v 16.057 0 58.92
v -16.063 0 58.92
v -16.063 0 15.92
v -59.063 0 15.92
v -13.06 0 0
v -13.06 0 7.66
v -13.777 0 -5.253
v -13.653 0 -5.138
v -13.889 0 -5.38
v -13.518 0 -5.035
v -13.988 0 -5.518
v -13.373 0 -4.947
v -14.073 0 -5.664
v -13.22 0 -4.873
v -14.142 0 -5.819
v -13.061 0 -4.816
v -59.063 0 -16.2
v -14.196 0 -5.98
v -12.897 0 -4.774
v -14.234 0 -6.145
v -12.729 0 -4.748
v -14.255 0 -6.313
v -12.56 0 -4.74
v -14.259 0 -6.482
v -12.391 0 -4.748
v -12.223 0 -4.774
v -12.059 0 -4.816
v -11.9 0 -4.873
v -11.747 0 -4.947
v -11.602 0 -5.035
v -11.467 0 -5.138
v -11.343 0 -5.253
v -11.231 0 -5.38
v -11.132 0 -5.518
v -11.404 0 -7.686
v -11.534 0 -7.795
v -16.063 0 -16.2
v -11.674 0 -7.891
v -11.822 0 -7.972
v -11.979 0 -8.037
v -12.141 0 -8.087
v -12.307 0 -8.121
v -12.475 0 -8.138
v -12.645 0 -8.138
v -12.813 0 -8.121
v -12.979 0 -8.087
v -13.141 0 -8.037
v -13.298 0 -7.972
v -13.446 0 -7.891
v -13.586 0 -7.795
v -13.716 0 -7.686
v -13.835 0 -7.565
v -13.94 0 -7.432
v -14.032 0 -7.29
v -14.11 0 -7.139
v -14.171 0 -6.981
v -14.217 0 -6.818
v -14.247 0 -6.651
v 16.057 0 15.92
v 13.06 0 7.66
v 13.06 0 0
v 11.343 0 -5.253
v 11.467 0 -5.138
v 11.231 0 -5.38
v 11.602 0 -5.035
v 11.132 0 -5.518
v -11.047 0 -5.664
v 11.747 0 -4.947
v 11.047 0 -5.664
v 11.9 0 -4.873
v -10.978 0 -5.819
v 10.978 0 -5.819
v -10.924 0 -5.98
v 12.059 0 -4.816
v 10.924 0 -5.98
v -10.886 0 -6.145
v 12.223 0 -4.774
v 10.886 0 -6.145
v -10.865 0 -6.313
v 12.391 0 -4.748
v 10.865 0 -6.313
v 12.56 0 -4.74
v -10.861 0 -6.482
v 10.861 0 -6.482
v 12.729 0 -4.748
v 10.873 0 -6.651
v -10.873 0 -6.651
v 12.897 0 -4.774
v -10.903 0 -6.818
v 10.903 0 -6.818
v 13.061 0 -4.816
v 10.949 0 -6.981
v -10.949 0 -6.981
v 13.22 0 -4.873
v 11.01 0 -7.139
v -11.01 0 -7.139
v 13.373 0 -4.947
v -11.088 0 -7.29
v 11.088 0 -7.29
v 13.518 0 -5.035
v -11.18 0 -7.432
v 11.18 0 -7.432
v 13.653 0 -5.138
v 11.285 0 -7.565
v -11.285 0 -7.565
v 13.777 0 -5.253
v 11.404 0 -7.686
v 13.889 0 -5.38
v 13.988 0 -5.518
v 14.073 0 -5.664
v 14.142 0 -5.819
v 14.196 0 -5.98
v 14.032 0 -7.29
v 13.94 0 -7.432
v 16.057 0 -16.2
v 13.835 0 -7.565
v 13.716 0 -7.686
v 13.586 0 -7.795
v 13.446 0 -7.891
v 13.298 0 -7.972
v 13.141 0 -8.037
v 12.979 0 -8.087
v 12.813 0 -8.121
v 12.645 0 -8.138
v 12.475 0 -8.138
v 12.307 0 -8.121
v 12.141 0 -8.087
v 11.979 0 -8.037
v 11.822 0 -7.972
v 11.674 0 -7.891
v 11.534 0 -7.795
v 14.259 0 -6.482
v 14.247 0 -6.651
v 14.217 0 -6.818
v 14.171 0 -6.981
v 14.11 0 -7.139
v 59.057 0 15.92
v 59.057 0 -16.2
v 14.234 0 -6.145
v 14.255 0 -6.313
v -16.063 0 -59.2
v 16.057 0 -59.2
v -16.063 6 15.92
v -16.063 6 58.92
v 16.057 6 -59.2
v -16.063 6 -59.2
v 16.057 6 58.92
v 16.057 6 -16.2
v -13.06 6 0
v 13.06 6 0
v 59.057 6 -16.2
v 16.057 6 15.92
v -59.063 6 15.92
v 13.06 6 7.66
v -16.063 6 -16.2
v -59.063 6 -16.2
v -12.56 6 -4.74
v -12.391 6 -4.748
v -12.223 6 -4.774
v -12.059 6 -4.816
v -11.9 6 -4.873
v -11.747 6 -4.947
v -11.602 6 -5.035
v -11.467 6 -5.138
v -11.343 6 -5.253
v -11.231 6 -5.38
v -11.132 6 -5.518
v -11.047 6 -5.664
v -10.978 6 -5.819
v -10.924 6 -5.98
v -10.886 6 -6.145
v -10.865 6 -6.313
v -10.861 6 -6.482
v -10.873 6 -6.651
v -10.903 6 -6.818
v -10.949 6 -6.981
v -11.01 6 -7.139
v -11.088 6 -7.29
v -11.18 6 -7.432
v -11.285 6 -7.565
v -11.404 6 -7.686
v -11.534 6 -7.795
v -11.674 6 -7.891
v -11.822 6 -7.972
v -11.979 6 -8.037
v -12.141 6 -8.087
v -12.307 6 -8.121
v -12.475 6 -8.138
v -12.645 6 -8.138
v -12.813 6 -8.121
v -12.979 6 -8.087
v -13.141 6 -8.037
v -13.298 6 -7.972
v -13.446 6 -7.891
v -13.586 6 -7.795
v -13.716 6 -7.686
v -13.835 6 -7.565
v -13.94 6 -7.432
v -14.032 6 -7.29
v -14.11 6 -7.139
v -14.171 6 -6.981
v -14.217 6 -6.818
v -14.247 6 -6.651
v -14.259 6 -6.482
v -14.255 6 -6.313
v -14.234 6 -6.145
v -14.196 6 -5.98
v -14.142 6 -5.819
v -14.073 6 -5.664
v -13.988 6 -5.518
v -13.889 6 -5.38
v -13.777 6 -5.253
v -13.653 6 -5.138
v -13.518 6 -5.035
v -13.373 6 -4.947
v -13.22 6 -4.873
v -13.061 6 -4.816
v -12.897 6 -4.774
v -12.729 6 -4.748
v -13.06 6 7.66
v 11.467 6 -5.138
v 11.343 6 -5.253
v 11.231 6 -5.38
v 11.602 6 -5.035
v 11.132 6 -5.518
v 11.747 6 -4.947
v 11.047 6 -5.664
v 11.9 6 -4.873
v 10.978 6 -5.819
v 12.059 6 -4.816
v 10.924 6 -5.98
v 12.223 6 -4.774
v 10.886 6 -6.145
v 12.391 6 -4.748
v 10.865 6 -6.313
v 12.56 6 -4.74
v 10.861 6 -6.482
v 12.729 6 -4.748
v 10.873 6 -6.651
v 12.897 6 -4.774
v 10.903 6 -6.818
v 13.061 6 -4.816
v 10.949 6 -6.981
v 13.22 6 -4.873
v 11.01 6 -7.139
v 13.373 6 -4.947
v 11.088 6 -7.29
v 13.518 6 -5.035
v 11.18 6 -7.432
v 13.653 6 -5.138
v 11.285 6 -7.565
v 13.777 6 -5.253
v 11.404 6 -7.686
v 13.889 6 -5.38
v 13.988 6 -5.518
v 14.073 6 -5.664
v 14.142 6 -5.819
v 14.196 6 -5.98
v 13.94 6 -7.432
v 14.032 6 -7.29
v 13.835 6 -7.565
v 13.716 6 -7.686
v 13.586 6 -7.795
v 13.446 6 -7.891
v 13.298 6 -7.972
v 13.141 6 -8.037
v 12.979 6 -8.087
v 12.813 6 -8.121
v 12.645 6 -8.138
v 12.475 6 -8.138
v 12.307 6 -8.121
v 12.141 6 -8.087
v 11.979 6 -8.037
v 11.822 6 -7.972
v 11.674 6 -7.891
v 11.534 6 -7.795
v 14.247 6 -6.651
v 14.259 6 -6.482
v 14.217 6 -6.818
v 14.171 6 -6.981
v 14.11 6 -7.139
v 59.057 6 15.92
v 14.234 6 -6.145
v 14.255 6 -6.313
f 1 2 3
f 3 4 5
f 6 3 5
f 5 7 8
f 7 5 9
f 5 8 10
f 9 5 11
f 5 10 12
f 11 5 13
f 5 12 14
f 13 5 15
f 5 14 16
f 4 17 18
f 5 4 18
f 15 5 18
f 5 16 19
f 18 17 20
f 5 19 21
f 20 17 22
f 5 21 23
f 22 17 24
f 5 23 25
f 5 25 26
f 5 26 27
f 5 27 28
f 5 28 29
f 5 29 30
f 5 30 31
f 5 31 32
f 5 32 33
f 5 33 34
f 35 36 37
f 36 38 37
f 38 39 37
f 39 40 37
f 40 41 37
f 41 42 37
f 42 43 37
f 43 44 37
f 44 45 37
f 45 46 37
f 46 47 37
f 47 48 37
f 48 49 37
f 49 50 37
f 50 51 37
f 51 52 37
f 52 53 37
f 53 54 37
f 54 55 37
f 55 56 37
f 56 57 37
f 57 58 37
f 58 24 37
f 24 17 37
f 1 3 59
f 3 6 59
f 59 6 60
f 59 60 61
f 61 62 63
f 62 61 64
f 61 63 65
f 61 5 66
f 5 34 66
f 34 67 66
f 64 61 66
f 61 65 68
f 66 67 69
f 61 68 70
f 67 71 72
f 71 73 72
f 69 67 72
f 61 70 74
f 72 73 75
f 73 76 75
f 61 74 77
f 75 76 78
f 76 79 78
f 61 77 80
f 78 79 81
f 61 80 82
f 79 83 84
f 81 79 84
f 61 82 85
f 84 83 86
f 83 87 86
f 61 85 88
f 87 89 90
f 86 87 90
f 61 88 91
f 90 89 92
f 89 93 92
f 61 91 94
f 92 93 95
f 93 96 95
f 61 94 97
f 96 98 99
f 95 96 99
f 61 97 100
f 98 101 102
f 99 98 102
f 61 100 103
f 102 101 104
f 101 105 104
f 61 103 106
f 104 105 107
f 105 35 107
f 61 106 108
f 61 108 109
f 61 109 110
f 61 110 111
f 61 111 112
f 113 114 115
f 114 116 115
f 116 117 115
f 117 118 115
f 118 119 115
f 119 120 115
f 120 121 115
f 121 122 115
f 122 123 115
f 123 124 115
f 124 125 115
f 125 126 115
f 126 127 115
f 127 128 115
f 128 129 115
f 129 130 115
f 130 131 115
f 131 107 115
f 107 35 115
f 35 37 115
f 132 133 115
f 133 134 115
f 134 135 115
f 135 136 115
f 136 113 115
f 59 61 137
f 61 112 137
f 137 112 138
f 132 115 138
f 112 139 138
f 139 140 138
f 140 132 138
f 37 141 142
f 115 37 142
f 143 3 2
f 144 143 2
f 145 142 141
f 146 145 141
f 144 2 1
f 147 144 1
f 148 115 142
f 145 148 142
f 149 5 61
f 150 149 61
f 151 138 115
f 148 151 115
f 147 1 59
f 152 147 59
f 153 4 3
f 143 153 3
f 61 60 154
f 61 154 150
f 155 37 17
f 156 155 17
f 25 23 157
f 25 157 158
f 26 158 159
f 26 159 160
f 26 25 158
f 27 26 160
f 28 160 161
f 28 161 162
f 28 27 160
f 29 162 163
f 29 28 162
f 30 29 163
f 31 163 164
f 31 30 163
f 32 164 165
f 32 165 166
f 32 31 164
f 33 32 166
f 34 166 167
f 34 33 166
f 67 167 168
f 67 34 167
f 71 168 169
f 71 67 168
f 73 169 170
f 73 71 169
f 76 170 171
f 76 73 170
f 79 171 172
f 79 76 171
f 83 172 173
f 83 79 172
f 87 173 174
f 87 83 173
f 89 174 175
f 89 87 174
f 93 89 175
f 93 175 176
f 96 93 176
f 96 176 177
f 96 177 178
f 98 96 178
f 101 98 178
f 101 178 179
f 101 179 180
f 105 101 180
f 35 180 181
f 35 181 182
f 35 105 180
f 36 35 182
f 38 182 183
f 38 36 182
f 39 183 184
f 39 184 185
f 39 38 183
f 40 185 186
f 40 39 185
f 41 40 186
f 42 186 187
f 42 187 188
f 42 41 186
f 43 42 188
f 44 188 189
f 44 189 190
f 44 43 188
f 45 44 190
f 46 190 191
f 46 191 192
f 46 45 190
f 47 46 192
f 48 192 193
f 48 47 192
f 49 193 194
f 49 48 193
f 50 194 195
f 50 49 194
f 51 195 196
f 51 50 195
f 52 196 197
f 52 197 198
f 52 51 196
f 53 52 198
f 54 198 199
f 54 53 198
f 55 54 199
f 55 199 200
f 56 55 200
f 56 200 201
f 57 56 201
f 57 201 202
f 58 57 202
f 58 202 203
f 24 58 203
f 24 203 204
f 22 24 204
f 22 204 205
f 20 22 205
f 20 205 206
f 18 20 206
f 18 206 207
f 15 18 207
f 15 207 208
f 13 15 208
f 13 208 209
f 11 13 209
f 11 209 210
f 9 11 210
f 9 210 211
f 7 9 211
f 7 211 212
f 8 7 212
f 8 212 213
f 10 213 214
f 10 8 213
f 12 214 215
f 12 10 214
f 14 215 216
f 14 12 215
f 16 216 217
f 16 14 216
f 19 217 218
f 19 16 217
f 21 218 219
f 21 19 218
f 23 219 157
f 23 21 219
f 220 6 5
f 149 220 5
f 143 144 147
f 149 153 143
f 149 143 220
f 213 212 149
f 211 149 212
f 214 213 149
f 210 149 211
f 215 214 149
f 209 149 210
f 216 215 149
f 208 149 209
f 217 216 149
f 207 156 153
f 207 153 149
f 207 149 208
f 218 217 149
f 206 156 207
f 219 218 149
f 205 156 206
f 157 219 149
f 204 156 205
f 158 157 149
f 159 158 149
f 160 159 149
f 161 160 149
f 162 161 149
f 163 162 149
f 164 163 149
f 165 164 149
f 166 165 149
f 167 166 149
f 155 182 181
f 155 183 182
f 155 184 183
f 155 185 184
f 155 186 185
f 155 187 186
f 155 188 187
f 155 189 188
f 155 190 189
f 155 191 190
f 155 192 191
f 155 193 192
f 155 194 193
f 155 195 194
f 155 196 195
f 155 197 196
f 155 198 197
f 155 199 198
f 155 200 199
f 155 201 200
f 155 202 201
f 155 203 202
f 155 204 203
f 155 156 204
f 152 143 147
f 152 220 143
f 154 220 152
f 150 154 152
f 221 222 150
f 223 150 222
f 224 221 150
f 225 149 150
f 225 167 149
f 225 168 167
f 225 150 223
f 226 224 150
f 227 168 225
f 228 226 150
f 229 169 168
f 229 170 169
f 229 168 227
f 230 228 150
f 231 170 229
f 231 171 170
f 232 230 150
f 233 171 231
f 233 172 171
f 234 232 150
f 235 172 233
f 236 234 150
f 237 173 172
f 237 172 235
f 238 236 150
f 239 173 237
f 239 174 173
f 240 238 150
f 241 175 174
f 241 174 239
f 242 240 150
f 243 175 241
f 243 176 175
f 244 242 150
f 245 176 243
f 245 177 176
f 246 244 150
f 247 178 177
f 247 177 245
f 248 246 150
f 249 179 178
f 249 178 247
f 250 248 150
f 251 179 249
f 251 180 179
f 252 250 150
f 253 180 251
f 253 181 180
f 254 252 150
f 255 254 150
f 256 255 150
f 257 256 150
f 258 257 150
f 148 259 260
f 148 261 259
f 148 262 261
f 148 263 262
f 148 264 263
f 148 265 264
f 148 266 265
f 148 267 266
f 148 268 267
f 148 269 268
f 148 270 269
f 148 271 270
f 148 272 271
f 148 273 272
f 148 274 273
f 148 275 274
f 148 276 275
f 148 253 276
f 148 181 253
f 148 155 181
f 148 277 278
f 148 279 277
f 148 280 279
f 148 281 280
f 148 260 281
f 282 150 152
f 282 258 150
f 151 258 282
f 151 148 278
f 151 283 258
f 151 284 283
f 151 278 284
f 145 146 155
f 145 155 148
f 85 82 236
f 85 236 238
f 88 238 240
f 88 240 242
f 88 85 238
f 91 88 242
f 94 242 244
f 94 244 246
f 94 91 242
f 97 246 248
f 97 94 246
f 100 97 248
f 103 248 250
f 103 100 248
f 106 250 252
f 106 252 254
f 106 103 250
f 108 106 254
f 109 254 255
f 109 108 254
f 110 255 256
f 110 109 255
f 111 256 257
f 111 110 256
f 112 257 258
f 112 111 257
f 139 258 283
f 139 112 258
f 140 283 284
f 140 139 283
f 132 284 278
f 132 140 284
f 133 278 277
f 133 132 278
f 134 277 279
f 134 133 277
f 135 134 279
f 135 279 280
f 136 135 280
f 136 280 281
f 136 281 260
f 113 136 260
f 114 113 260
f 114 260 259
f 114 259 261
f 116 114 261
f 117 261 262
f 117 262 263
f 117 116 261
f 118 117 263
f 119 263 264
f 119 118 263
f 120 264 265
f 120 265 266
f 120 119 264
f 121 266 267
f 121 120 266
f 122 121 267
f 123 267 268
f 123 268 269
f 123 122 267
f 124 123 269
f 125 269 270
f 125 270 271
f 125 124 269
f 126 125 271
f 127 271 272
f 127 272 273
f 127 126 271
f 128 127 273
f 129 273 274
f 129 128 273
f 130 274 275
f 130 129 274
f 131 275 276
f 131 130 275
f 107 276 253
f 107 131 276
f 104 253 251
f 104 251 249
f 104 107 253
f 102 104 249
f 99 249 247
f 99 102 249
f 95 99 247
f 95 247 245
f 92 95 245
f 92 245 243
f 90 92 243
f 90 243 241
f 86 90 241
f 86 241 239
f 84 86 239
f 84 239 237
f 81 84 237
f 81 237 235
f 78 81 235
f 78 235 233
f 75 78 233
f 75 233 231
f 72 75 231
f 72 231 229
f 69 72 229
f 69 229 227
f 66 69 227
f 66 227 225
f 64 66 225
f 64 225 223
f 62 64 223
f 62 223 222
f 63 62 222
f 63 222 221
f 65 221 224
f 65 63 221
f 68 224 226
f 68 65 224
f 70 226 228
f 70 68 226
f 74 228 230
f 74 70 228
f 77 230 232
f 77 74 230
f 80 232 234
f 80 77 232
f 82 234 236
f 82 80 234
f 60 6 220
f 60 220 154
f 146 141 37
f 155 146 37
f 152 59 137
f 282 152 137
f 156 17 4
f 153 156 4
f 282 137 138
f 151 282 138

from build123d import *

# Parameters (mm, degrees)
SKETCH21_R           = 1.7
SKETCH21_W           = 26.12
SKETCH21_H           = 7.66
BOSS_EXTRUDE18_DEPTH = 6


with BuildPart() as part:
    # Sketch21 → Boss-Extrude18 (new body)
    with BuildSketch(Plane(origin=(0, 0, 0), x_dir=(1, 0, 0), z_dir=(0, 1, 0))):
        Polygon((-0.002759086, 59.199662961), (-16.062759086, 59.199662961), (-16.062759086, 16.199662961), (-59.062759086, 16.199662961), (-59.062759086, 0.139662961), (-59.062759086, -15.920337039), (-16.062759086, -15.920337039), (-16.062759086, -58.920337039), (-0.002759086, -58.920337039), (16.057240914, -58.920337039), (16.057240914, -15.920337039), (59.057240914, -15.920337039), (59.057240914, 0.139662961), (59.057240914, 16.199662961), (16.057240914, 16.199662961), (16.057240914, 59.199662961), align=None)
        with Locations(Location((-12.56, 6.44, 0), (0, 0, 270))):
            Circle(SKETCH21_R, mode=Mode.SUBTRACT)
        with Locations(Location((12.56, 6.44, 0), (0, 0, 270))):
            Circle(SKETCH21_R, mode=Mode.SUBTRACT)
        with Locations((0, -3.83)):
            Rectangle(SKETCH21_W, SKETCH21_H, mode=Mode.SUBTRACT)
    extrude(amount=BOSS_EXTRUDE18_DEPTH)


solid = part.part
